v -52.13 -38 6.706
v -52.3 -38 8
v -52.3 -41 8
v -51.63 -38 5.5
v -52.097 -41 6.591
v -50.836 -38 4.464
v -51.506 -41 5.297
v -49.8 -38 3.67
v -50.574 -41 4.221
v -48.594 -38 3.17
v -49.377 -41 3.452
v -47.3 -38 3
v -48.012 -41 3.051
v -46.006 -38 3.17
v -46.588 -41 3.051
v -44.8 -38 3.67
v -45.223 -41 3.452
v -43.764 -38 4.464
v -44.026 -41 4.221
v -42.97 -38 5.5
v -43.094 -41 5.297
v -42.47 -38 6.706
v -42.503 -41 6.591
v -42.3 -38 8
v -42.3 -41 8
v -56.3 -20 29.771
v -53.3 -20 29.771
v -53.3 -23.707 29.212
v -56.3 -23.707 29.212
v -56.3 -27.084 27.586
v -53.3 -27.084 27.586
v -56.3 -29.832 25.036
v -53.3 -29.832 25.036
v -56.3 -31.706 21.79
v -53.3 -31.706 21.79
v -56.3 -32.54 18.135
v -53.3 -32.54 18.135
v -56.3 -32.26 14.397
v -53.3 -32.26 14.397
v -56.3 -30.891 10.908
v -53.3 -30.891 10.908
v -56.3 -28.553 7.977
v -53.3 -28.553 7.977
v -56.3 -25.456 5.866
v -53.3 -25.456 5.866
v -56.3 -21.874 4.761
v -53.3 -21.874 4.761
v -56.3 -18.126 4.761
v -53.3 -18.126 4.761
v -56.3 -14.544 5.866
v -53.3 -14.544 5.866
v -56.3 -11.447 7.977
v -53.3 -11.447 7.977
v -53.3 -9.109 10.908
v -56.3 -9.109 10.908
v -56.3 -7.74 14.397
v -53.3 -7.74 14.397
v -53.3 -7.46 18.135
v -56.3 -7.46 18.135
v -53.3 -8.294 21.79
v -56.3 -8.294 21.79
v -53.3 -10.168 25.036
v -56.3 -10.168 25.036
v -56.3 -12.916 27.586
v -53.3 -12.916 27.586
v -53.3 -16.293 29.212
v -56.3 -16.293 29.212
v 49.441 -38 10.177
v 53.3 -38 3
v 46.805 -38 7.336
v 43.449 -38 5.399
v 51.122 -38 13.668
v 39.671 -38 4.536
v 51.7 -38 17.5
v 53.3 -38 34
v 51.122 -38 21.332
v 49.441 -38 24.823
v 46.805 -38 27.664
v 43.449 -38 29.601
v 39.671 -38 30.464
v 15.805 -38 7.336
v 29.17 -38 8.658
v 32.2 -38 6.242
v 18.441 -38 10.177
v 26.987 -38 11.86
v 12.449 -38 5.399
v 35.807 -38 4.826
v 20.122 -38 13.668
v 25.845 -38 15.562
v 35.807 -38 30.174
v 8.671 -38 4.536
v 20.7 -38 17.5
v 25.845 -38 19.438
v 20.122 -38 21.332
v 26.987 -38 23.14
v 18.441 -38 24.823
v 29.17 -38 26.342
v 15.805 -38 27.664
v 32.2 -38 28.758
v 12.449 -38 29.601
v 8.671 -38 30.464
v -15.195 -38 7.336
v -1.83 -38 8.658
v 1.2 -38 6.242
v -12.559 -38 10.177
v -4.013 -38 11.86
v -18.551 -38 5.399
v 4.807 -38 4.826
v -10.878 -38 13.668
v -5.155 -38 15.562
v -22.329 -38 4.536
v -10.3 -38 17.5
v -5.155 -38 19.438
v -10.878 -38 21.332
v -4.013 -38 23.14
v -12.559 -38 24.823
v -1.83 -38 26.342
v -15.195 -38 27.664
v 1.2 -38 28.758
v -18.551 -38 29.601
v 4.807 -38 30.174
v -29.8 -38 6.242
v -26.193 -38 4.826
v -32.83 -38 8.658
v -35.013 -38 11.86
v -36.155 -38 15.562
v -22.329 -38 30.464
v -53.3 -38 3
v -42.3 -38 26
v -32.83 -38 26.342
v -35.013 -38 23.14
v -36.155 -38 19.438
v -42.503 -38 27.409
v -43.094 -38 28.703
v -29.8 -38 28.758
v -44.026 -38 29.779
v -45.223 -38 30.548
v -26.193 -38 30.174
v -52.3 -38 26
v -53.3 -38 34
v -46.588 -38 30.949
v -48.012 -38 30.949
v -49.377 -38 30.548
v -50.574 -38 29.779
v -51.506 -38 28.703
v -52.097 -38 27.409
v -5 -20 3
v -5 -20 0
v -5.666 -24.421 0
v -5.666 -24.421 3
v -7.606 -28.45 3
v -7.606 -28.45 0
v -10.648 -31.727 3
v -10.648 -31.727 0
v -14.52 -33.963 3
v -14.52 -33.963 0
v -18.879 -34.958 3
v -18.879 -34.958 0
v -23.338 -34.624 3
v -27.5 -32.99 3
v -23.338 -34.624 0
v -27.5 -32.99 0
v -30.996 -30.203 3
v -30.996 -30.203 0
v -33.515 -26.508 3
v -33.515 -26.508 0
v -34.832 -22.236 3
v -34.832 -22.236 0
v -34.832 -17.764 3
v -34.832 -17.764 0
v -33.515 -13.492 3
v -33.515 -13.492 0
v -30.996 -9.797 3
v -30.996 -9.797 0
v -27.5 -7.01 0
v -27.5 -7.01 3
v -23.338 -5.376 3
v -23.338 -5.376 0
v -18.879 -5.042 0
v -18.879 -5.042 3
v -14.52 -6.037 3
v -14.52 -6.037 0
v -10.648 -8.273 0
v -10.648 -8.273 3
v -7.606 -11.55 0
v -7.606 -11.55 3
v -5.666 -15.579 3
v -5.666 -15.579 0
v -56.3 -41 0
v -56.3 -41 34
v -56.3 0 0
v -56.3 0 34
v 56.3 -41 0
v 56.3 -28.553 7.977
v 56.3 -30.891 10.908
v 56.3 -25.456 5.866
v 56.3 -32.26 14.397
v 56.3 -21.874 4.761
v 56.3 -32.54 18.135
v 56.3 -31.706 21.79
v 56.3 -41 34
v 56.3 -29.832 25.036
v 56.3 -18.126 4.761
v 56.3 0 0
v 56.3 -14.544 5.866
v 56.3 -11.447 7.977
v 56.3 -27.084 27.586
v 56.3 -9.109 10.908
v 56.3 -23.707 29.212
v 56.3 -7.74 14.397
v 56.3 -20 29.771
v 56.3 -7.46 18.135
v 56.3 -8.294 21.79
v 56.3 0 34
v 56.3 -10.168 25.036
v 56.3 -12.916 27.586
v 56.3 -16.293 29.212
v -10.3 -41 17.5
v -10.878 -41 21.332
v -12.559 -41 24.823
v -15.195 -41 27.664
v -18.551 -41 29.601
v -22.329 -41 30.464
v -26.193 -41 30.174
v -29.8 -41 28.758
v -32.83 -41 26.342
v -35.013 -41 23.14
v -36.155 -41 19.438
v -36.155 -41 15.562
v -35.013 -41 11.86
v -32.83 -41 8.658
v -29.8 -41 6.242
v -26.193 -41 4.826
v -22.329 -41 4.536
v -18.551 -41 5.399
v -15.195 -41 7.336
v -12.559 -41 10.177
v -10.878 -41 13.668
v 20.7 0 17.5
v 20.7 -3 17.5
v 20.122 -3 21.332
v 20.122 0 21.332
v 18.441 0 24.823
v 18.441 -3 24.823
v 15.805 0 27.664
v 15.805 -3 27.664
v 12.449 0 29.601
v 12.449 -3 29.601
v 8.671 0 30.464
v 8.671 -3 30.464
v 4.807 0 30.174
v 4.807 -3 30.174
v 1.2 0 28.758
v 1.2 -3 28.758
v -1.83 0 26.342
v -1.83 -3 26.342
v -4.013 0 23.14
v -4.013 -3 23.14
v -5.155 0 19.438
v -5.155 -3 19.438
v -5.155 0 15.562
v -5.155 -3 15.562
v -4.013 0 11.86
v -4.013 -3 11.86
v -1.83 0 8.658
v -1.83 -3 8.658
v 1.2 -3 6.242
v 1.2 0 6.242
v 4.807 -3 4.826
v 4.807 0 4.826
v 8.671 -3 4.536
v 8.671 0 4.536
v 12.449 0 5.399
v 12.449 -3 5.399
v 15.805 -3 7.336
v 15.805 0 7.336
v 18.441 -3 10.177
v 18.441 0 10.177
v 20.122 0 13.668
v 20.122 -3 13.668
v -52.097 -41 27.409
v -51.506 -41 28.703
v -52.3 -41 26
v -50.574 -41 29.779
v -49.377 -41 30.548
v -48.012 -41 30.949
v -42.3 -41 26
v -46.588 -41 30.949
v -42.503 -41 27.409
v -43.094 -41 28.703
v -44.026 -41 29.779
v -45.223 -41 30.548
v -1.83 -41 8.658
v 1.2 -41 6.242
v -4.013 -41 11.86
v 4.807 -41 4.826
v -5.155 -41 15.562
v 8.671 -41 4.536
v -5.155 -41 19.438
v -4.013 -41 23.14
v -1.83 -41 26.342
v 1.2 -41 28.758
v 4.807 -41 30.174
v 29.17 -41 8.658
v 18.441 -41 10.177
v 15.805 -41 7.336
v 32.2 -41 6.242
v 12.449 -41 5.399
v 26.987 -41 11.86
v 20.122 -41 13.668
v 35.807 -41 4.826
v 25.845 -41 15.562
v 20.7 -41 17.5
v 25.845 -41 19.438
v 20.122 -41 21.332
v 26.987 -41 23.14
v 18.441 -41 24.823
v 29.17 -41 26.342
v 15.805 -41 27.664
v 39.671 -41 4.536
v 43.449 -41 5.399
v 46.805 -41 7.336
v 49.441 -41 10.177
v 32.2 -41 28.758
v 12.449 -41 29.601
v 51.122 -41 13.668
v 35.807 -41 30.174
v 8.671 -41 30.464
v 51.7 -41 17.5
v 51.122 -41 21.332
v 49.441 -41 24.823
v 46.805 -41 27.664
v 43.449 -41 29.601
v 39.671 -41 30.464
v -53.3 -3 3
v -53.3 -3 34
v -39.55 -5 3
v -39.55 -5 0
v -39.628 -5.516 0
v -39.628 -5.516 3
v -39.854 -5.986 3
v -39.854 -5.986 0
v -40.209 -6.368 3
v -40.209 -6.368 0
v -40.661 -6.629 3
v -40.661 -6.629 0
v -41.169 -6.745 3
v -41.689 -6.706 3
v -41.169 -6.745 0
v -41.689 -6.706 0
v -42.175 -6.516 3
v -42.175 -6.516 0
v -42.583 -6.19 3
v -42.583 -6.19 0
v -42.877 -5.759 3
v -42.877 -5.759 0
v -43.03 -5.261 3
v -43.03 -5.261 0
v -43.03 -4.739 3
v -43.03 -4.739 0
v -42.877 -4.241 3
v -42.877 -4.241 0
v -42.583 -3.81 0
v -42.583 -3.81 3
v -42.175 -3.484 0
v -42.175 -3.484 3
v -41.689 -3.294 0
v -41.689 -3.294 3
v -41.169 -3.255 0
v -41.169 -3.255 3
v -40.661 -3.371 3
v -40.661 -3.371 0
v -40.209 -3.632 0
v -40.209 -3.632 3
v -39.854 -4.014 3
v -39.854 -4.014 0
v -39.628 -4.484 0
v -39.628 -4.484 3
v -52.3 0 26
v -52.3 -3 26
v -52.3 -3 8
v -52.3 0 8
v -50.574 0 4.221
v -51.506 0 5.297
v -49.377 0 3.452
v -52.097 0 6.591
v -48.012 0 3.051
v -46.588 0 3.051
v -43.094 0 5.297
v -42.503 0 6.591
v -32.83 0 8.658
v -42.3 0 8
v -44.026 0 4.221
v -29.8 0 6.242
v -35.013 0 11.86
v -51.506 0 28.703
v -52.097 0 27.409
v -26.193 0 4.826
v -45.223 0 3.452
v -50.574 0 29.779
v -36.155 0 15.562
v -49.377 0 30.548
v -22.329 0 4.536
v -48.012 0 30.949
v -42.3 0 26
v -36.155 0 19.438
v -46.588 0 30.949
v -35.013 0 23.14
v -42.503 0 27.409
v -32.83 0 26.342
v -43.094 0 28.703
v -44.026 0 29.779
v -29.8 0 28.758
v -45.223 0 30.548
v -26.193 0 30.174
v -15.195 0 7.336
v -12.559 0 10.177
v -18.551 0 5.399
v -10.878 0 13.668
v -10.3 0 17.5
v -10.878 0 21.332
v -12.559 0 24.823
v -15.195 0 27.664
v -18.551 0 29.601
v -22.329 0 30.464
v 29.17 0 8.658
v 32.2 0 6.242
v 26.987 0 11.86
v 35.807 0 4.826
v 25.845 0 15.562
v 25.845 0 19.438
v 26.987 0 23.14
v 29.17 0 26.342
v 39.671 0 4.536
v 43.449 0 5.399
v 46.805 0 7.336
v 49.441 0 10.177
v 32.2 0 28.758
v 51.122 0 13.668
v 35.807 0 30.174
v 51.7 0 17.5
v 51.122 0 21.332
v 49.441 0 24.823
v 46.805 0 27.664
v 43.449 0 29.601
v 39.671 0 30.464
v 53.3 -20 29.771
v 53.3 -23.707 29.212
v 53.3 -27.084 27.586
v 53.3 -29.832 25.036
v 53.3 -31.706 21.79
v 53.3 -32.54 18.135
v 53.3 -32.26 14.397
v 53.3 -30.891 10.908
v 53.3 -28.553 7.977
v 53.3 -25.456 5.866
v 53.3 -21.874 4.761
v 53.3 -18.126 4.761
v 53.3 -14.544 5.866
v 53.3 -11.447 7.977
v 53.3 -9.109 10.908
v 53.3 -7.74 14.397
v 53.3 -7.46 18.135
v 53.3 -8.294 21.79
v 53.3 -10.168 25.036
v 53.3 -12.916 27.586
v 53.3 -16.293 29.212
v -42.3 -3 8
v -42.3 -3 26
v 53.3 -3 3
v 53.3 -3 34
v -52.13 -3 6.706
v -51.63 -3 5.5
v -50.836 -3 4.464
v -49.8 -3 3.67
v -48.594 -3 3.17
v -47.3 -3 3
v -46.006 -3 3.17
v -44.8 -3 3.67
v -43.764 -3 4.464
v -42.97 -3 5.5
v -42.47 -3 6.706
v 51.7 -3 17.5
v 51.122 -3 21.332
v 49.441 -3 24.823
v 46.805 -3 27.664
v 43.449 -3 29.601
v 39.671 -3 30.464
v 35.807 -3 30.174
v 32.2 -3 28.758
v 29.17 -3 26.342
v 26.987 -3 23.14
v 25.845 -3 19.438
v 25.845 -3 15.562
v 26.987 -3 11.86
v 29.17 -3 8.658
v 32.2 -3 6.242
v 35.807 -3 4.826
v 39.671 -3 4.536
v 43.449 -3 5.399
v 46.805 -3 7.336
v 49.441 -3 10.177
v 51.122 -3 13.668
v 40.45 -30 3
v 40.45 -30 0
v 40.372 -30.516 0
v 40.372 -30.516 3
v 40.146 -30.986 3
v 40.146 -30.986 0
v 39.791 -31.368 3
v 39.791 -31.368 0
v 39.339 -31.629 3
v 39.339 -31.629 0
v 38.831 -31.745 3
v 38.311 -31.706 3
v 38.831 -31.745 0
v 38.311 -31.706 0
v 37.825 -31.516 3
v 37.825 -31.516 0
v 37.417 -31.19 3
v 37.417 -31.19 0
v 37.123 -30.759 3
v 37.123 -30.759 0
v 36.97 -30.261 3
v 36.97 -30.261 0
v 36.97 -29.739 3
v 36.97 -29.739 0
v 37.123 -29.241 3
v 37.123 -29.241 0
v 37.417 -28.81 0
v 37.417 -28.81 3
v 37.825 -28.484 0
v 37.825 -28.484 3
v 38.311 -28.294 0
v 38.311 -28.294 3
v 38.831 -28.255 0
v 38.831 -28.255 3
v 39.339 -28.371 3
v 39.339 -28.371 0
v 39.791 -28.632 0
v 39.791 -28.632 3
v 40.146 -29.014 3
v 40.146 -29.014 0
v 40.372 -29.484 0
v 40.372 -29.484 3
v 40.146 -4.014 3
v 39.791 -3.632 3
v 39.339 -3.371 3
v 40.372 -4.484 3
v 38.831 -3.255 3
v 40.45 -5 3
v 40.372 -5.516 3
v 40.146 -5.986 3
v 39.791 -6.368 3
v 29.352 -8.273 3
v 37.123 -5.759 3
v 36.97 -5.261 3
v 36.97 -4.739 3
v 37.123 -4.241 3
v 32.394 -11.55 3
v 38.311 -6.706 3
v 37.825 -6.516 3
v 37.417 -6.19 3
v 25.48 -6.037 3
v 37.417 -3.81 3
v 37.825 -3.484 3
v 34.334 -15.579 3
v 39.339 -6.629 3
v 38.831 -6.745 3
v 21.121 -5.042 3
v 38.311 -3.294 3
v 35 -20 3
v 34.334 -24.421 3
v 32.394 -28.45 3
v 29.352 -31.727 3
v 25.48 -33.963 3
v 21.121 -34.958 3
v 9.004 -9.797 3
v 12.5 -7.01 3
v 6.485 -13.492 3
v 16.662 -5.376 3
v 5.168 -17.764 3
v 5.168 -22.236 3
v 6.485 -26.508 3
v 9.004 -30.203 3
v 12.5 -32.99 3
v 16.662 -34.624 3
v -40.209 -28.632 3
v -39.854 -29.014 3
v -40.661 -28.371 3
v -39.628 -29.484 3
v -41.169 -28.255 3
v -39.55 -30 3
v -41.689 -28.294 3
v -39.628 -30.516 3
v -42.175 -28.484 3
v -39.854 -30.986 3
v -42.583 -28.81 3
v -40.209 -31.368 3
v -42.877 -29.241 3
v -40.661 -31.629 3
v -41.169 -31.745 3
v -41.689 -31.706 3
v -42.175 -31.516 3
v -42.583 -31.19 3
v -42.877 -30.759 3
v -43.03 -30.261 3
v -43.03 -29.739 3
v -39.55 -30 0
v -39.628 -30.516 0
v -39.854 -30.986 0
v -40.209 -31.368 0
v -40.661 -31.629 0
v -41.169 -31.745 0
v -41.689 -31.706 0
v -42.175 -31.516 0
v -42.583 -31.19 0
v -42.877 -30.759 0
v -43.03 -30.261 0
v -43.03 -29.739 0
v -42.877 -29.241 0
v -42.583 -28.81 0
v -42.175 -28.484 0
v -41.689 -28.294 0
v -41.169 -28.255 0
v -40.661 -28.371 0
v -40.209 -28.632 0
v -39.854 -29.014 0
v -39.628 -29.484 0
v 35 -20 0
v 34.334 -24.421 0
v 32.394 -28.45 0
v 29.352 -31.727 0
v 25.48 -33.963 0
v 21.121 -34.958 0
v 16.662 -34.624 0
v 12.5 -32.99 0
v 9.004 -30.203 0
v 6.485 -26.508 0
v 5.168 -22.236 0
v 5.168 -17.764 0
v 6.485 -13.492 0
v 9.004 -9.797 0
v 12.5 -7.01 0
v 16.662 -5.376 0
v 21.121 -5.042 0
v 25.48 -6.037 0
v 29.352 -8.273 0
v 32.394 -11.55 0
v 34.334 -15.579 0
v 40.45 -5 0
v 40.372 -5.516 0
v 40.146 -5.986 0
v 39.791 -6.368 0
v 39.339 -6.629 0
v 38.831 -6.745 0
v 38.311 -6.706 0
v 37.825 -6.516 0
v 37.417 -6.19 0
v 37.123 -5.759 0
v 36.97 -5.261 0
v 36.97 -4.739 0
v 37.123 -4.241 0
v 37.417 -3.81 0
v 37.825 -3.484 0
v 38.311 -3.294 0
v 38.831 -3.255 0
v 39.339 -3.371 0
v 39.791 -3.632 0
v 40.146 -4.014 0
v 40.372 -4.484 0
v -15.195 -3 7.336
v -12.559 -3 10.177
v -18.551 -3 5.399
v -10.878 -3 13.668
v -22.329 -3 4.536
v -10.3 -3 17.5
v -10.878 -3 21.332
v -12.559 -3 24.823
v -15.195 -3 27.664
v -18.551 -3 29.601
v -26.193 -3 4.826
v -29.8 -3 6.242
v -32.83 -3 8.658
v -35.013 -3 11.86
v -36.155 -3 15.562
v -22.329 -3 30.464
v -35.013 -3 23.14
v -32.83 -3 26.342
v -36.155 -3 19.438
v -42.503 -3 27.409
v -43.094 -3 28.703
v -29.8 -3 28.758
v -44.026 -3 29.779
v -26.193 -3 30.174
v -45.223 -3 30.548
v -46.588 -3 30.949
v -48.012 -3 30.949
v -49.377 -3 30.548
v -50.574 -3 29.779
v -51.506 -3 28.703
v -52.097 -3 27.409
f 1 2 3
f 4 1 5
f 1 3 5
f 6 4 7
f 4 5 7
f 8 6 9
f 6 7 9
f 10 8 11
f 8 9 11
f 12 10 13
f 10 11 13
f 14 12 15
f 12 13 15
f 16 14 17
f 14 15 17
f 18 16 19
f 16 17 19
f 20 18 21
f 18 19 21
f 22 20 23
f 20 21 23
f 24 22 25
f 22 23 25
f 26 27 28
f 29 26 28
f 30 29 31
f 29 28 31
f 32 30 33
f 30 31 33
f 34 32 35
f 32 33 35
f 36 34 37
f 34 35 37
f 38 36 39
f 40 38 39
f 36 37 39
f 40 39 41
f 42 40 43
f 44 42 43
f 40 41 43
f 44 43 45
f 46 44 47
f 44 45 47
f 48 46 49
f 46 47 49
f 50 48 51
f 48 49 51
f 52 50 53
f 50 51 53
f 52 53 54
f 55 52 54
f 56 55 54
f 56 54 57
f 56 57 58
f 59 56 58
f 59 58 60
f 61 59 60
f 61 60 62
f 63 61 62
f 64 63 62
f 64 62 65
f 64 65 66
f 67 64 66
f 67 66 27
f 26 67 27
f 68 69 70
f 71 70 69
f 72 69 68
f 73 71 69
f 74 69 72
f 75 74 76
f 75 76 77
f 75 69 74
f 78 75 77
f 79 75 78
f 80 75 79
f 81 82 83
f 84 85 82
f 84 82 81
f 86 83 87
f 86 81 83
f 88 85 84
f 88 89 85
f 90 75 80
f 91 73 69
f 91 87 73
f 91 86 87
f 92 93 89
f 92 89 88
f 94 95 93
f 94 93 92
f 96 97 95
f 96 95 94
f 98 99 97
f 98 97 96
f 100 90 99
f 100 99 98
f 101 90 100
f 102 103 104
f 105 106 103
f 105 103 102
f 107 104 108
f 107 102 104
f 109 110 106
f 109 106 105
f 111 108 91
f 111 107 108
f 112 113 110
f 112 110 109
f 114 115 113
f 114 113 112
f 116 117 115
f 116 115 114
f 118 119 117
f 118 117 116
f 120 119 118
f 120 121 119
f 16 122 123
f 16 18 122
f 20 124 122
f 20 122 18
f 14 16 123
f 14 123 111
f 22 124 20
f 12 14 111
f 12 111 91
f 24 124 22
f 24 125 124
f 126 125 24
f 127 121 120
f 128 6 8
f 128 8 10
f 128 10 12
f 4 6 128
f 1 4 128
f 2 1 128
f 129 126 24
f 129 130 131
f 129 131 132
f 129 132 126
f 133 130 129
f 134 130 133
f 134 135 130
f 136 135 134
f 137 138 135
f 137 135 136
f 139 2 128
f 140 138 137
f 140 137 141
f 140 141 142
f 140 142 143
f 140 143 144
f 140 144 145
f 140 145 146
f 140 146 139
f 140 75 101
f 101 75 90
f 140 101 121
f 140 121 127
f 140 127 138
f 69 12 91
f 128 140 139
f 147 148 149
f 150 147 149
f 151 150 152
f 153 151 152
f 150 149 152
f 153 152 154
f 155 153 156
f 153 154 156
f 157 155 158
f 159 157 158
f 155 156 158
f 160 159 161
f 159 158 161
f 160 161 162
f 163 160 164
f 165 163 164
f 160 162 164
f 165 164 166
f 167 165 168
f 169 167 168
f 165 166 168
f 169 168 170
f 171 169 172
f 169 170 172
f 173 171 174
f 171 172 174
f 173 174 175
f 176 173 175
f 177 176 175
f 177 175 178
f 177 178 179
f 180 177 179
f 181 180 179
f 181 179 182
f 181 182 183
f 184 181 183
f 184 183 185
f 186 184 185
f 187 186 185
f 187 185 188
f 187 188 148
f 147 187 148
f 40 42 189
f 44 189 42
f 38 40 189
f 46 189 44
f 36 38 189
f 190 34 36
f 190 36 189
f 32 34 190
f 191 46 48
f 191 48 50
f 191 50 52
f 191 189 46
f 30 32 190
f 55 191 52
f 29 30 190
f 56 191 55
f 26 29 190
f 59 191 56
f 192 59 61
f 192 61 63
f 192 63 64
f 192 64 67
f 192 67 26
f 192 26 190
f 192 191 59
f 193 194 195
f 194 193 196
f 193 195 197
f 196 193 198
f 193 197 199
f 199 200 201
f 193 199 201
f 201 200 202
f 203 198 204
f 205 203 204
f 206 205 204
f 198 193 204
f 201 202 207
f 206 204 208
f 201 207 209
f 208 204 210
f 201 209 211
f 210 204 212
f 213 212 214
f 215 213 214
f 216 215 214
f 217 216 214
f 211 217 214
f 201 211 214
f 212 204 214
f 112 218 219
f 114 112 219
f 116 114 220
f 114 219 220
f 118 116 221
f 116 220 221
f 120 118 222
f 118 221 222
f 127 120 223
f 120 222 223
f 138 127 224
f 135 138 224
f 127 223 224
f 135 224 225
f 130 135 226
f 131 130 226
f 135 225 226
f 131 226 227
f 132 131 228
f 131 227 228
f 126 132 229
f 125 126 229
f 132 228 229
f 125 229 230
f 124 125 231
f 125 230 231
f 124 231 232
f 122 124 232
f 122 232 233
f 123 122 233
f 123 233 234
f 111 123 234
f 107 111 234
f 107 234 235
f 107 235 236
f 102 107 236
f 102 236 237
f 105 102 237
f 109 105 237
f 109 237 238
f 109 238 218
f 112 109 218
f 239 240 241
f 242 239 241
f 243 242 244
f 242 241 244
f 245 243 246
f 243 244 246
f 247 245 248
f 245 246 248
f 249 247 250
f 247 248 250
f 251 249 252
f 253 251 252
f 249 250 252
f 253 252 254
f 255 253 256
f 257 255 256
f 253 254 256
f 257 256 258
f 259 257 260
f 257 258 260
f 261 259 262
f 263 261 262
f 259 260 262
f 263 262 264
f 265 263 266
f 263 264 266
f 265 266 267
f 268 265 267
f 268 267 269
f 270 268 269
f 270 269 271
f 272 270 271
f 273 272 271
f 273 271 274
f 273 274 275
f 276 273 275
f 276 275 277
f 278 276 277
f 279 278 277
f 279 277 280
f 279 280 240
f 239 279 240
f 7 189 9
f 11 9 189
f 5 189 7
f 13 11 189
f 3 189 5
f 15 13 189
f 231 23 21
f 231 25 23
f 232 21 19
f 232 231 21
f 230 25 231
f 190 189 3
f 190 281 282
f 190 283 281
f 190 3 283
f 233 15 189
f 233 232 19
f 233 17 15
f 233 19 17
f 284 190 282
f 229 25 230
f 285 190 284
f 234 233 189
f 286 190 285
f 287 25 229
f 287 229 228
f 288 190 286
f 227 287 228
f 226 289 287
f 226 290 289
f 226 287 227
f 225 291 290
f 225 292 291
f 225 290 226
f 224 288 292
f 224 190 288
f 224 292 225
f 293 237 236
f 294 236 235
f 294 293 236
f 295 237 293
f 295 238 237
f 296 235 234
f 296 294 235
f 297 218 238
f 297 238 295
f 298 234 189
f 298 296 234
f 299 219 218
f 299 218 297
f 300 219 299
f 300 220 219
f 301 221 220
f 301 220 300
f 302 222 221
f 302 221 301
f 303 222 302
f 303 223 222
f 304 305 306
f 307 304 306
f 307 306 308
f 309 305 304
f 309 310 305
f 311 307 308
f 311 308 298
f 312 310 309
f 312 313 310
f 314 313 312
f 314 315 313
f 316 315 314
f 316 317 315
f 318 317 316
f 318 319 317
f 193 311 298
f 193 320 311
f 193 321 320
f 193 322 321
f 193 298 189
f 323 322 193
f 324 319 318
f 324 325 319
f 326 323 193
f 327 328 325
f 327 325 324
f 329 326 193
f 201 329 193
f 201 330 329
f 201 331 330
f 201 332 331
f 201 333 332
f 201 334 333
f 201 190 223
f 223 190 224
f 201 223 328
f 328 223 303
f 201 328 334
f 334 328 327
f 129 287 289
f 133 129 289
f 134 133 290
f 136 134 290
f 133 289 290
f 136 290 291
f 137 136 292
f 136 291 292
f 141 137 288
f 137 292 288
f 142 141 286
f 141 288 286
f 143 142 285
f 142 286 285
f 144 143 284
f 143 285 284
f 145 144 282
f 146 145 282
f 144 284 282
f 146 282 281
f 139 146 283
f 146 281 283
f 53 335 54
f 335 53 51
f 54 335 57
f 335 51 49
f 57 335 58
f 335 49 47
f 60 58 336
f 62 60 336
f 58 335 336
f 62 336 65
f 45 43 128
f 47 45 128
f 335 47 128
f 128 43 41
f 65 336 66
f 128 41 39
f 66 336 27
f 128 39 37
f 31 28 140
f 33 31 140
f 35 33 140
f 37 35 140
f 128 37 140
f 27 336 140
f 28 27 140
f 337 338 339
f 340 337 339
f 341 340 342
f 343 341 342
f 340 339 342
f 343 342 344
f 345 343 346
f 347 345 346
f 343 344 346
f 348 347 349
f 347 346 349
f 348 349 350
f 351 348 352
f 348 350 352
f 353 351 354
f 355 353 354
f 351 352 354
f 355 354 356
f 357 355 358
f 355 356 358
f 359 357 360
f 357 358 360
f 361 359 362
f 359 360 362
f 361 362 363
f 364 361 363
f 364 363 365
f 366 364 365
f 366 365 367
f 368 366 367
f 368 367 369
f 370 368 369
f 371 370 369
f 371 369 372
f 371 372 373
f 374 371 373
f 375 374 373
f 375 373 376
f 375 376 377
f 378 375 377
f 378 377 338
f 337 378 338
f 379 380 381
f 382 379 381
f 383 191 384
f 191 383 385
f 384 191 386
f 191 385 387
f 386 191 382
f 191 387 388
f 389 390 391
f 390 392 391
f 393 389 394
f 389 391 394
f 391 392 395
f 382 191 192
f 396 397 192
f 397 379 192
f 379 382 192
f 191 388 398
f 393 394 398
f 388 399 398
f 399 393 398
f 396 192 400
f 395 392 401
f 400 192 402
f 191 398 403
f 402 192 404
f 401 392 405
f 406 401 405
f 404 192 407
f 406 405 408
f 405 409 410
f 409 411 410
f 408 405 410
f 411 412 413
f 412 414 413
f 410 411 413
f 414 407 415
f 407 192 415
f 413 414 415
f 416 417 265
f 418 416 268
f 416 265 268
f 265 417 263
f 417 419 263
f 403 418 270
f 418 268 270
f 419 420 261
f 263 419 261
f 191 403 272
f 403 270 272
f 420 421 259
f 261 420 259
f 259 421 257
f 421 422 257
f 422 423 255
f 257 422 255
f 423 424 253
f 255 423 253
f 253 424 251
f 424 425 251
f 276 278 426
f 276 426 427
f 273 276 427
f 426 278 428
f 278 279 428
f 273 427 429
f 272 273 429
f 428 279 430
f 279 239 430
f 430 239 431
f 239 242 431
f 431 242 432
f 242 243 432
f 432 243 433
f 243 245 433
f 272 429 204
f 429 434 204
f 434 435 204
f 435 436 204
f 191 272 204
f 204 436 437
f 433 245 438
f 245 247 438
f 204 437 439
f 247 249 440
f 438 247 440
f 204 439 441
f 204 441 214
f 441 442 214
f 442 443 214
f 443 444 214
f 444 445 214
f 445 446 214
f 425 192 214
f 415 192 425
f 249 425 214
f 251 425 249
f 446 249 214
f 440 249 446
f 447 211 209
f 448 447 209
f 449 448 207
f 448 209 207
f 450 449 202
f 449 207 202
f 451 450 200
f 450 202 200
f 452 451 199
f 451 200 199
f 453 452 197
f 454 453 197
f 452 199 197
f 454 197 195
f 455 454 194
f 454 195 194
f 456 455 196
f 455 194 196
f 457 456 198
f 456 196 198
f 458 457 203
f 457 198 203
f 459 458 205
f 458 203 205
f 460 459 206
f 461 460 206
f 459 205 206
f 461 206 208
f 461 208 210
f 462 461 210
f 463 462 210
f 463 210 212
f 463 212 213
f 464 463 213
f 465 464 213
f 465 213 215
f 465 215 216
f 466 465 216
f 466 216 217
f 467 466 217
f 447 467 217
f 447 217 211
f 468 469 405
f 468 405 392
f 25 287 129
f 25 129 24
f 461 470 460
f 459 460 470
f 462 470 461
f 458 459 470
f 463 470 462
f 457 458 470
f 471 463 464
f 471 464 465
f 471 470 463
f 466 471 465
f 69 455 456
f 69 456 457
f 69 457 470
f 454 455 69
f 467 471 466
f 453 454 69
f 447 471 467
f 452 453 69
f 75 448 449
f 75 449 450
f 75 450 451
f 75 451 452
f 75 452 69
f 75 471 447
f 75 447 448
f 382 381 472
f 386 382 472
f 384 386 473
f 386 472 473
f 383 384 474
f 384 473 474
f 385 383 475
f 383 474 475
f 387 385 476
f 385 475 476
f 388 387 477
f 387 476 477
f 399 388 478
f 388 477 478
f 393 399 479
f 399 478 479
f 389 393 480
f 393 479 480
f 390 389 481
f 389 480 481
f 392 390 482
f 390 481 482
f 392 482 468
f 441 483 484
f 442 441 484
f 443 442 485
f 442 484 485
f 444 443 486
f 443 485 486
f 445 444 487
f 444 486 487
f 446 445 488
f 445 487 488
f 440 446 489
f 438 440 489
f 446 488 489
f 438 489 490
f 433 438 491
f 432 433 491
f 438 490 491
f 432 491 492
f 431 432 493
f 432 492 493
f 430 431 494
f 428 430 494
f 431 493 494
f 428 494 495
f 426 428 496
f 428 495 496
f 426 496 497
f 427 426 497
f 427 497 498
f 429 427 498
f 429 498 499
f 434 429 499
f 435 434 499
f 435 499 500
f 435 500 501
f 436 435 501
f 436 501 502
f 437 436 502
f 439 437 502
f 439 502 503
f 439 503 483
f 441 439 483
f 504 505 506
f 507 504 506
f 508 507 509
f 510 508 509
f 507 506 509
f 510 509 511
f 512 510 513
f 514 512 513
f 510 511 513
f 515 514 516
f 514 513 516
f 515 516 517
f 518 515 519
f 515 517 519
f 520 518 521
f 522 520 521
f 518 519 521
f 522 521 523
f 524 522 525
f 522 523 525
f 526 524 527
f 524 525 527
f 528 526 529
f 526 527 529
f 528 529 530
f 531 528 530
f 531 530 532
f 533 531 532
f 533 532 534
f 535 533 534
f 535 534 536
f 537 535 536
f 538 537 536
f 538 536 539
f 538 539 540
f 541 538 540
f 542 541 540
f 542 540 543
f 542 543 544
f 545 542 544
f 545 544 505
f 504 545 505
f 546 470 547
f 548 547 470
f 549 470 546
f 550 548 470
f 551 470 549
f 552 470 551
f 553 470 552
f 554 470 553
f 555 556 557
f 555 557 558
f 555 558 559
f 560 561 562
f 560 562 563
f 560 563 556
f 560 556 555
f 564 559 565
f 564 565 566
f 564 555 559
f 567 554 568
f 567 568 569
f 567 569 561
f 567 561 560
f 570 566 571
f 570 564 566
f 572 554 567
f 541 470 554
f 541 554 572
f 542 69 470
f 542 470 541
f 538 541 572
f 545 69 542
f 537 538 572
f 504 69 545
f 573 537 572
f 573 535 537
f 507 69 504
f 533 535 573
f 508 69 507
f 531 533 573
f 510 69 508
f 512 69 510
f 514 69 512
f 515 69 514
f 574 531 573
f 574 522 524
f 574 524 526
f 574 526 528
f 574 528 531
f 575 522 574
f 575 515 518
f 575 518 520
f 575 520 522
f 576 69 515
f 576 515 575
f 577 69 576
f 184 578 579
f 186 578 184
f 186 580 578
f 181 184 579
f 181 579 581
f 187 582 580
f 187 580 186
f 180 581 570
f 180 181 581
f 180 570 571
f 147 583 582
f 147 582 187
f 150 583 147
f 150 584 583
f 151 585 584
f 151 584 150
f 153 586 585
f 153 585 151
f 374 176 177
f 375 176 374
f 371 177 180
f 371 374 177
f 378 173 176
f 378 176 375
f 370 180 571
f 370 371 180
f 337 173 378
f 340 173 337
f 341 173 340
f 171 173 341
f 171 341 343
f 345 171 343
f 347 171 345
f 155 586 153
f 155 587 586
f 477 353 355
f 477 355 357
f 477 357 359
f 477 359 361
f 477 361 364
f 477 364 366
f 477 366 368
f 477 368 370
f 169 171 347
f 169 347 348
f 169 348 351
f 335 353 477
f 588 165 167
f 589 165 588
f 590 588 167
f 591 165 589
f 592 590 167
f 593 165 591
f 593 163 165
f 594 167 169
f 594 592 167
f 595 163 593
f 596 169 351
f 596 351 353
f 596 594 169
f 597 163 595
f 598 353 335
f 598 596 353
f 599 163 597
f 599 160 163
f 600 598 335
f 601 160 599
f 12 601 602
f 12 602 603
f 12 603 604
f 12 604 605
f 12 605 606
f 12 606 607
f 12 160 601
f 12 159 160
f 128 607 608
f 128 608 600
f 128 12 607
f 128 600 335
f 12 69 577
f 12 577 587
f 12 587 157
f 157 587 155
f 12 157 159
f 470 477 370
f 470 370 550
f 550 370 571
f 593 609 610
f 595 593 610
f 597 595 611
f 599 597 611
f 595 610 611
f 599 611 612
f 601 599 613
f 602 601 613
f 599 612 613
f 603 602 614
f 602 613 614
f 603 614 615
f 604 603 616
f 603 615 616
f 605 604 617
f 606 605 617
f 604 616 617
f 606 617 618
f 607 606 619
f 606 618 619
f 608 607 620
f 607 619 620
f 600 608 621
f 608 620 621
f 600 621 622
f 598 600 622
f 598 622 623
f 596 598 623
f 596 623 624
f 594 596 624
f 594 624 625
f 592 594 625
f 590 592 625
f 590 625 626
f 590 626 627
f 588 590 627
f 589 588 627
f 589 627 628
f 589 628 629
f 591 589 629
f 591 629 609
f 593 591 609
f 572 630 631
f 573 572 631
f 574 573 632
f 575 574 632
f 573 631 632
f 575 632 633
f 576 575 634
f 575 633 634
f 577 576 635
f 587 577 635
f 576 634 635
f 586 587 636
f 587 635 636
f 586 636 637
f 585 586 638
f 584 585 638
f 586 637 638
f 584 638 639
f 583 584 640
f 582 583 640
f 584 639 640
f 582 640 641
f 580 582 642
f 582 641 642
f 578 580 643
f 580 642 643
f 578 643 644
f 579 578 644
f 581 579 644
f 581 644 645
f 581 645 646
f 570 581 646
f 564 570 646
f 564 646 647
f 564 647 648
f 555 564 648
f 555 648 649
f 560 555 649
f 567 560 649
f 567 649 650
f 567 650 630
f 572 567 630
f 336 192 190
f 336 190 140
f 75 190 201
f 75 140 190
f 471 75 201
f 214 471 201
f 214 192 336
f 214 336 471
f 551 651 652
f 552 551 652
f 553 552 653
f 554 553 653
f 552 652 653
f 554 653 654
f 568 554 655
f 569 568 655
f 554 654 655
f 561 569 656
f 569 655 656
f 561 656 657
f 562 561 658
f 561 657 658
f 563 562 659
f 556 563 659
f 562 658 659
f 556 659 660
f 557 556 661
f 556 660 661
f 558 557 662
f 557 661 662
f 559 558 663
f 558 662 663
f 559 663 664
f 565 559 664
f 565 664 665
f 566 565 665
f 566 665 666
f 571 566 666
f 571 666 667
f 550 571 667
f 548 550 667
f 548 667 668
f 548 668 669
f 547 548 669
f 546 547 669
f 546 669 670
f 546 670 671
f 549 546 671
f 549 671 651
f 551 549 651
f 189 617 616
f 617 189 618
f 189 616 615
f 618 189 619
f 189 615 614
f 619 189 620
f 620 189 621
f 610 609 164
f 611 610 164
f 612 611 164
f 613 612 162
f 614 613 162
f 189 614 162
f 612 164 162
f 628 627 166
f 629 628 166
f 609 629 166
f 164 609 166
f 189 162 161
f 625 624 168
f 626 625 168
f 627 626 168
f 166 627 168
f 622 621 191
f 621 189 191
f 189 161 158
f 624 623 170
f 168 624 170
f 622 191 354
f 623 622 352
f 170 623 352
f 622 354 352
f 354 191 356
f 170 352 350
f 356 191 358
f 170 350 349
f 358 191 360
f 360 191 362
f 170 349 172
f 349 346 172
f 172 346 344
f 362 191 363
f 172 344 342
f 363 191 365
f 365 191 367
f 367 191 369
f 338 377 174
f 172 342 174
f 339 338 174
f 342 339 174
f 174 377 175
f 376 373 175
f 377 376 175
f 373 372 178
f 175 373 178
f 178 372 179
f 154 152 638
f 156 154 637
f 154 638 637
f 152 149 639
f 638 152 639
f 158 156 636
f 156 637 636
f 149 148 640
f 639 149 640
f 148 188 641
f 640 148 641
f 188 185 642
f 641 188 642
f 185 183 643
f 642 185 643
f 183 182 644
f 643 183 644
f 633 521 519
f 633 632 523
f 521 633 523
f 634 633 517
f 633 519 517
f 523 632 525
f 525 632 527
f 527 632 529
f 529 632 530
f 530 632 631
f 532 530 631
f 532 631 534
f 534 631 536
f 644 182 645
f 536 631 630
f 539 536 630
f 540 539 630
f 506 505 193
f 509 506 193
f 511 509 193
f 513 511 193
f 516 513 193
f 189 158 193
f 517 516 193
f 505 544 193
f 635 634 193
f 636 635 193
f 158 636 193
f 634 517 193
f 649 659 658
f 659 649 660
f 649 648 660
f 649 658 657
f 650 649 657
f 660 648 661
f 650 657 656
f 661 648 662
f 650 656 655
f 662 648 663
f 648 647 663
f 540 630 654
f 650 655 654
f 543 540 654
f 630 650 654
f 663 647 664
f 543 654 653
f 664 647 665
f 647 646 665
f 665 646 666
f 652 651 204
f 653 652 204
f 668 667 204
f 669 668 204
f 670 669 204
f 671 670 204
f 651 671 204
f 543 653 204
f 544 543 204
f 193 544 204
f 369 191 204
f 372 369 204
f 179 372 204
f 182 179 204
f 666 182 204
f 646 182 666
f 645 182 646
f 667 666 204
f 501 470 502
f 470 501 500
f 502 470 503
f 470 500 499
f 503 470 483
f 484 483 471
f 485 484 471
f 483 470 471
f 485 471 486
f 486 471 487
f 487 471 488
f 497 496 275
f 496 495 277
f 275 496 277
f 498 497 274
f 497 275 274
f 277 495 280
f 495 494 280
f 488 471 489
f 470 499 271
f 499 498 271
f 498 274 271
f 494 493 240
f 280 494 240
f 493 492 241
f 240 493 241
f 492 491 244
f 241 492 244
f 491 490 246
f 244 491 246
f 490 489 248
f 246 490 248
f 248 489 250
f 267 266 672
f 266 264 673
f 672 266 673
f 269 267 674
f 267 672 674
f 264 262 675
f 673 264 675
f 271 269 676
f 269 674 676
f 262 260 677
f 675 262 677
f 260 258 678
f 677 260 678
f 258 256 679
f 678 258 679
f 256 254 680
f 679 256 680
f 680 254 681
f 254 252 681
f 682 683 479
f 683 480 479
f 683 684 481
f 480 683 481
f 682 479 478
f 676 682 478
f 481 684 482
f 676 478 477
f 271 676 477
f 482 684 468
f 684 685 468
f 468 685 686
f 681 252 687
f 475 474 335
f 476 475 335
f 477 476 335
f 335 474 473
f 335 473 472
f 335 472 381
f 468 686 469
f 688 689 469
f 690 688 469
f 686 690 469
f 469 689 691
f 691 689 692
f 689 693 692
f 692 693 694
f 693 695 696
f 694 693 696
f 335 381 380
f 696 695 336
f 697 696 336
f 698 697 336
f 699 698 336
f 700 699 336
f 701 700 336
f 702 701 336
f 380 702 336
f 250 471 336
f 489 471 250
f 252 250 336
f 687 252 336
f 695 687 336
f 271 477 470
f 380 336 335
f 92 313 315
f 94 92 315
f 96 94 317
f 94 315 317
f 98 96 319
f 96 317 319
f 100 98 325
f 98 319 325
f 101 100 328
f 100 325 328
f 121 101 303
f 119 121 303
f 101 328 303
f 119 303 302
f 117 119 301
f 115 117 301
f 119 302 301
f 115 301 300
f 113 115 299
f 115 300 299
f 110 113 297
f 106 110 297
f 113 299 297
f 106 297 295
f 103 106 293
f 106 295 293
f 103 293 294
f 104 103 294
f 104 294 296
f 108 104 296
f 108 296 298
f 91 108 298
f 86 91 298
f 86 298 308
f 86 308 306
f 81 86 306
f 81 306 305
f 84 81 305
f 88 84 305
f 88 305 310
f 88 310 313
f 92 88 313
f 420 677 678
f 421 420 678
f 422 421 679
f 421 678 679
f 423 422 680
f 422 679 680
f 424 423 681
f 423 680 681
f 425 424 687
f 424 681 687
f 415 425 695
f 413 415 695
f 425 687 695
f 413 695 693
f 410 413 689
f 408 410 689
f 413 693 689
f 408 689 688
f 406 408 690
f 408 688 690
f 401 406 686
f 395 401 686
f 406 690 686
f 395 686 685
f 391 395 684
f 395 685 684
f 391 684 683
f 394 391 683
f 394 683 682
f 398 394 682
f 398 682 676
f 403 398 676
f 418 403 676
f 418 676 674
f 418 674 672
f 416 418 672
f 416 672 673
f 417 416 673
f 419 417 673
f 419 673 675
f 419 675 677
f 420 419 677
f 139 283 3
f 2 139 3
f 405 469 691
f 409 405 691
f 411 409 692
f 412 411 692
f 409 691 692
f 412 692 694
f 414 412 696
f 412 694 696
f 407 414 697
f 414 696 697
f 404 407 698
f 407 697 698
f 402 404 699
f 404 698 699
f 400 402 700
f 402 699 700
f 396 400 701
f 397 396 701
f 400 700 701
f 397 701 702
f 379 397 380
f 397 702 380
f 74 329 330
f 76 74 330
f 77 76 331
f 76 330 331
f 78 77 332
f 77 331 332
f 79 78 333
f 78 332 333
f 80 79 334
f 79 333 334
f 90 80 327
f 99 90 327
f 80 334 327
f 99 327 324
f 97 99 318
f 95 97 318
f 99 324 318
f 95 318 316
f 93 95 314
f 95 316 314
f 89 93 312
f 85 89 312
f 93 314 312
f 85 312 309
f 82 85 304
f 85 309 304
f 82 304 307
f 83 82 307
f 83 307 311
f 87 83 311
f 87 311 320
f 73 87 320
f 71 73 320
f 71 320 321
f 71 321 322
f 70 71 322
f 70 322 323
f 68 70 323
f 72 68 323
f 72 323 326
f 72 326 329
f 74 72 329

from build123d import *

# Parameters (mm, degrees)
SKETCH_W        = 112.6
SKETCH_H        = 34
PAD_DEPTH       = 41
SKETCH005_W     = 106.6
SKETCH005_H     = 35
POCKET_DEPTH    = 31
SKETCH007_R     = 13
POCKET001_DEPTH = 41.001
SKETCH006_R     = 1.75
SKETCH006_R_2   = 15
POCKET002_DEPTH = 5
SKETCH008_R     = 12.575466
POCKET003_DEPTH = 112.601


with BuildPart() as part:
    # Sketch → Pad (new body)
    with BuildSketch(Plane.XZ):
        with Locations((0, 17)):
            Rectangle(SKETCH_W, SKETCH_H)
    extrude(amount=PAD_DEPTH)

    # Sketch005 → Pocket (cut)
    with BuildSketch(Plane(origin=(0, 0, 34), x_dir=(-1, 0, 0), z_dir=(0, 0, 1))):
        with Locations((0, 20.5)):
            Rectangle(SKETCH005_W, SKETCH005_H)
    extrude(amount=-POCKET_DEPTH, mode=Mode.SUBTRACT)

    # Sketch007 → Pocket001 (cut, through all)
    with BuildSketch(Plane.XZ.offset(41)):
        with Locations((-23.3, 17.5)):
            Circle(SKETCH007_R)
        with Locations((7.7, 17.5)):
            Circle(SKETCH007_R)
        with Locations((38.7, 17.5)):
            Circle(SKETCH007_R)
        with BuildLine():
            ThreePointArc((-42.3, 26), (-47.3, 31), (-52.3, 26))
            Line((-52.3, 26), (-52.3, 8.000019))
            ThreePointArc((-52.3, 8.000019), (-47.3, 3), (-42.3, 8.000019))
            Line((-42.3, 26), (-42.3, 8.000019))
        make_face()
    extrude(amount=-POCKET001_DEPTH, mode=Mode.SUBTRACT)

    # Sketch006 → Pocket002 (cut)
    with BuildSketch(Plane(origin=(0, 0, 0), x_dir=(1, 0, 0), z_dir=(0, 0, -1))):
        with Locations((-41.3, 30)):
            Circle(SKETCH006_R)
        with Locations((38.7, 30)):
            Circle(SKETCH006_R)
        with Locations((-41.3, 5)):
            Circle(SKETCH006_R)
        with Locations((38.7, 5)):
            Circle(SKETCH006_R)
        with Locations((-20, 20)):
            Circle(SKETCH006_R_2)
        with Locations((20, 20)):
            Circle(SKETCH006_R_2)
    extrude(amount=-POCKET002_DEPTH, mode=Mode.SUBTRACT)

    # Sketch008 → Pocket003 (cut, through all)
    with BuildSketch(Plane(origin=(56.3, 0, 0), x_dir=(0, 0, 1), z_dir=(1, 0, 0))):
        with Locations((17.195639, 20)):
            Circle(SKETCH008_R)
    extrude(amount=-POCKET003_DEPTH, mode=Mode.SUBTRACT)


solid = part.part
